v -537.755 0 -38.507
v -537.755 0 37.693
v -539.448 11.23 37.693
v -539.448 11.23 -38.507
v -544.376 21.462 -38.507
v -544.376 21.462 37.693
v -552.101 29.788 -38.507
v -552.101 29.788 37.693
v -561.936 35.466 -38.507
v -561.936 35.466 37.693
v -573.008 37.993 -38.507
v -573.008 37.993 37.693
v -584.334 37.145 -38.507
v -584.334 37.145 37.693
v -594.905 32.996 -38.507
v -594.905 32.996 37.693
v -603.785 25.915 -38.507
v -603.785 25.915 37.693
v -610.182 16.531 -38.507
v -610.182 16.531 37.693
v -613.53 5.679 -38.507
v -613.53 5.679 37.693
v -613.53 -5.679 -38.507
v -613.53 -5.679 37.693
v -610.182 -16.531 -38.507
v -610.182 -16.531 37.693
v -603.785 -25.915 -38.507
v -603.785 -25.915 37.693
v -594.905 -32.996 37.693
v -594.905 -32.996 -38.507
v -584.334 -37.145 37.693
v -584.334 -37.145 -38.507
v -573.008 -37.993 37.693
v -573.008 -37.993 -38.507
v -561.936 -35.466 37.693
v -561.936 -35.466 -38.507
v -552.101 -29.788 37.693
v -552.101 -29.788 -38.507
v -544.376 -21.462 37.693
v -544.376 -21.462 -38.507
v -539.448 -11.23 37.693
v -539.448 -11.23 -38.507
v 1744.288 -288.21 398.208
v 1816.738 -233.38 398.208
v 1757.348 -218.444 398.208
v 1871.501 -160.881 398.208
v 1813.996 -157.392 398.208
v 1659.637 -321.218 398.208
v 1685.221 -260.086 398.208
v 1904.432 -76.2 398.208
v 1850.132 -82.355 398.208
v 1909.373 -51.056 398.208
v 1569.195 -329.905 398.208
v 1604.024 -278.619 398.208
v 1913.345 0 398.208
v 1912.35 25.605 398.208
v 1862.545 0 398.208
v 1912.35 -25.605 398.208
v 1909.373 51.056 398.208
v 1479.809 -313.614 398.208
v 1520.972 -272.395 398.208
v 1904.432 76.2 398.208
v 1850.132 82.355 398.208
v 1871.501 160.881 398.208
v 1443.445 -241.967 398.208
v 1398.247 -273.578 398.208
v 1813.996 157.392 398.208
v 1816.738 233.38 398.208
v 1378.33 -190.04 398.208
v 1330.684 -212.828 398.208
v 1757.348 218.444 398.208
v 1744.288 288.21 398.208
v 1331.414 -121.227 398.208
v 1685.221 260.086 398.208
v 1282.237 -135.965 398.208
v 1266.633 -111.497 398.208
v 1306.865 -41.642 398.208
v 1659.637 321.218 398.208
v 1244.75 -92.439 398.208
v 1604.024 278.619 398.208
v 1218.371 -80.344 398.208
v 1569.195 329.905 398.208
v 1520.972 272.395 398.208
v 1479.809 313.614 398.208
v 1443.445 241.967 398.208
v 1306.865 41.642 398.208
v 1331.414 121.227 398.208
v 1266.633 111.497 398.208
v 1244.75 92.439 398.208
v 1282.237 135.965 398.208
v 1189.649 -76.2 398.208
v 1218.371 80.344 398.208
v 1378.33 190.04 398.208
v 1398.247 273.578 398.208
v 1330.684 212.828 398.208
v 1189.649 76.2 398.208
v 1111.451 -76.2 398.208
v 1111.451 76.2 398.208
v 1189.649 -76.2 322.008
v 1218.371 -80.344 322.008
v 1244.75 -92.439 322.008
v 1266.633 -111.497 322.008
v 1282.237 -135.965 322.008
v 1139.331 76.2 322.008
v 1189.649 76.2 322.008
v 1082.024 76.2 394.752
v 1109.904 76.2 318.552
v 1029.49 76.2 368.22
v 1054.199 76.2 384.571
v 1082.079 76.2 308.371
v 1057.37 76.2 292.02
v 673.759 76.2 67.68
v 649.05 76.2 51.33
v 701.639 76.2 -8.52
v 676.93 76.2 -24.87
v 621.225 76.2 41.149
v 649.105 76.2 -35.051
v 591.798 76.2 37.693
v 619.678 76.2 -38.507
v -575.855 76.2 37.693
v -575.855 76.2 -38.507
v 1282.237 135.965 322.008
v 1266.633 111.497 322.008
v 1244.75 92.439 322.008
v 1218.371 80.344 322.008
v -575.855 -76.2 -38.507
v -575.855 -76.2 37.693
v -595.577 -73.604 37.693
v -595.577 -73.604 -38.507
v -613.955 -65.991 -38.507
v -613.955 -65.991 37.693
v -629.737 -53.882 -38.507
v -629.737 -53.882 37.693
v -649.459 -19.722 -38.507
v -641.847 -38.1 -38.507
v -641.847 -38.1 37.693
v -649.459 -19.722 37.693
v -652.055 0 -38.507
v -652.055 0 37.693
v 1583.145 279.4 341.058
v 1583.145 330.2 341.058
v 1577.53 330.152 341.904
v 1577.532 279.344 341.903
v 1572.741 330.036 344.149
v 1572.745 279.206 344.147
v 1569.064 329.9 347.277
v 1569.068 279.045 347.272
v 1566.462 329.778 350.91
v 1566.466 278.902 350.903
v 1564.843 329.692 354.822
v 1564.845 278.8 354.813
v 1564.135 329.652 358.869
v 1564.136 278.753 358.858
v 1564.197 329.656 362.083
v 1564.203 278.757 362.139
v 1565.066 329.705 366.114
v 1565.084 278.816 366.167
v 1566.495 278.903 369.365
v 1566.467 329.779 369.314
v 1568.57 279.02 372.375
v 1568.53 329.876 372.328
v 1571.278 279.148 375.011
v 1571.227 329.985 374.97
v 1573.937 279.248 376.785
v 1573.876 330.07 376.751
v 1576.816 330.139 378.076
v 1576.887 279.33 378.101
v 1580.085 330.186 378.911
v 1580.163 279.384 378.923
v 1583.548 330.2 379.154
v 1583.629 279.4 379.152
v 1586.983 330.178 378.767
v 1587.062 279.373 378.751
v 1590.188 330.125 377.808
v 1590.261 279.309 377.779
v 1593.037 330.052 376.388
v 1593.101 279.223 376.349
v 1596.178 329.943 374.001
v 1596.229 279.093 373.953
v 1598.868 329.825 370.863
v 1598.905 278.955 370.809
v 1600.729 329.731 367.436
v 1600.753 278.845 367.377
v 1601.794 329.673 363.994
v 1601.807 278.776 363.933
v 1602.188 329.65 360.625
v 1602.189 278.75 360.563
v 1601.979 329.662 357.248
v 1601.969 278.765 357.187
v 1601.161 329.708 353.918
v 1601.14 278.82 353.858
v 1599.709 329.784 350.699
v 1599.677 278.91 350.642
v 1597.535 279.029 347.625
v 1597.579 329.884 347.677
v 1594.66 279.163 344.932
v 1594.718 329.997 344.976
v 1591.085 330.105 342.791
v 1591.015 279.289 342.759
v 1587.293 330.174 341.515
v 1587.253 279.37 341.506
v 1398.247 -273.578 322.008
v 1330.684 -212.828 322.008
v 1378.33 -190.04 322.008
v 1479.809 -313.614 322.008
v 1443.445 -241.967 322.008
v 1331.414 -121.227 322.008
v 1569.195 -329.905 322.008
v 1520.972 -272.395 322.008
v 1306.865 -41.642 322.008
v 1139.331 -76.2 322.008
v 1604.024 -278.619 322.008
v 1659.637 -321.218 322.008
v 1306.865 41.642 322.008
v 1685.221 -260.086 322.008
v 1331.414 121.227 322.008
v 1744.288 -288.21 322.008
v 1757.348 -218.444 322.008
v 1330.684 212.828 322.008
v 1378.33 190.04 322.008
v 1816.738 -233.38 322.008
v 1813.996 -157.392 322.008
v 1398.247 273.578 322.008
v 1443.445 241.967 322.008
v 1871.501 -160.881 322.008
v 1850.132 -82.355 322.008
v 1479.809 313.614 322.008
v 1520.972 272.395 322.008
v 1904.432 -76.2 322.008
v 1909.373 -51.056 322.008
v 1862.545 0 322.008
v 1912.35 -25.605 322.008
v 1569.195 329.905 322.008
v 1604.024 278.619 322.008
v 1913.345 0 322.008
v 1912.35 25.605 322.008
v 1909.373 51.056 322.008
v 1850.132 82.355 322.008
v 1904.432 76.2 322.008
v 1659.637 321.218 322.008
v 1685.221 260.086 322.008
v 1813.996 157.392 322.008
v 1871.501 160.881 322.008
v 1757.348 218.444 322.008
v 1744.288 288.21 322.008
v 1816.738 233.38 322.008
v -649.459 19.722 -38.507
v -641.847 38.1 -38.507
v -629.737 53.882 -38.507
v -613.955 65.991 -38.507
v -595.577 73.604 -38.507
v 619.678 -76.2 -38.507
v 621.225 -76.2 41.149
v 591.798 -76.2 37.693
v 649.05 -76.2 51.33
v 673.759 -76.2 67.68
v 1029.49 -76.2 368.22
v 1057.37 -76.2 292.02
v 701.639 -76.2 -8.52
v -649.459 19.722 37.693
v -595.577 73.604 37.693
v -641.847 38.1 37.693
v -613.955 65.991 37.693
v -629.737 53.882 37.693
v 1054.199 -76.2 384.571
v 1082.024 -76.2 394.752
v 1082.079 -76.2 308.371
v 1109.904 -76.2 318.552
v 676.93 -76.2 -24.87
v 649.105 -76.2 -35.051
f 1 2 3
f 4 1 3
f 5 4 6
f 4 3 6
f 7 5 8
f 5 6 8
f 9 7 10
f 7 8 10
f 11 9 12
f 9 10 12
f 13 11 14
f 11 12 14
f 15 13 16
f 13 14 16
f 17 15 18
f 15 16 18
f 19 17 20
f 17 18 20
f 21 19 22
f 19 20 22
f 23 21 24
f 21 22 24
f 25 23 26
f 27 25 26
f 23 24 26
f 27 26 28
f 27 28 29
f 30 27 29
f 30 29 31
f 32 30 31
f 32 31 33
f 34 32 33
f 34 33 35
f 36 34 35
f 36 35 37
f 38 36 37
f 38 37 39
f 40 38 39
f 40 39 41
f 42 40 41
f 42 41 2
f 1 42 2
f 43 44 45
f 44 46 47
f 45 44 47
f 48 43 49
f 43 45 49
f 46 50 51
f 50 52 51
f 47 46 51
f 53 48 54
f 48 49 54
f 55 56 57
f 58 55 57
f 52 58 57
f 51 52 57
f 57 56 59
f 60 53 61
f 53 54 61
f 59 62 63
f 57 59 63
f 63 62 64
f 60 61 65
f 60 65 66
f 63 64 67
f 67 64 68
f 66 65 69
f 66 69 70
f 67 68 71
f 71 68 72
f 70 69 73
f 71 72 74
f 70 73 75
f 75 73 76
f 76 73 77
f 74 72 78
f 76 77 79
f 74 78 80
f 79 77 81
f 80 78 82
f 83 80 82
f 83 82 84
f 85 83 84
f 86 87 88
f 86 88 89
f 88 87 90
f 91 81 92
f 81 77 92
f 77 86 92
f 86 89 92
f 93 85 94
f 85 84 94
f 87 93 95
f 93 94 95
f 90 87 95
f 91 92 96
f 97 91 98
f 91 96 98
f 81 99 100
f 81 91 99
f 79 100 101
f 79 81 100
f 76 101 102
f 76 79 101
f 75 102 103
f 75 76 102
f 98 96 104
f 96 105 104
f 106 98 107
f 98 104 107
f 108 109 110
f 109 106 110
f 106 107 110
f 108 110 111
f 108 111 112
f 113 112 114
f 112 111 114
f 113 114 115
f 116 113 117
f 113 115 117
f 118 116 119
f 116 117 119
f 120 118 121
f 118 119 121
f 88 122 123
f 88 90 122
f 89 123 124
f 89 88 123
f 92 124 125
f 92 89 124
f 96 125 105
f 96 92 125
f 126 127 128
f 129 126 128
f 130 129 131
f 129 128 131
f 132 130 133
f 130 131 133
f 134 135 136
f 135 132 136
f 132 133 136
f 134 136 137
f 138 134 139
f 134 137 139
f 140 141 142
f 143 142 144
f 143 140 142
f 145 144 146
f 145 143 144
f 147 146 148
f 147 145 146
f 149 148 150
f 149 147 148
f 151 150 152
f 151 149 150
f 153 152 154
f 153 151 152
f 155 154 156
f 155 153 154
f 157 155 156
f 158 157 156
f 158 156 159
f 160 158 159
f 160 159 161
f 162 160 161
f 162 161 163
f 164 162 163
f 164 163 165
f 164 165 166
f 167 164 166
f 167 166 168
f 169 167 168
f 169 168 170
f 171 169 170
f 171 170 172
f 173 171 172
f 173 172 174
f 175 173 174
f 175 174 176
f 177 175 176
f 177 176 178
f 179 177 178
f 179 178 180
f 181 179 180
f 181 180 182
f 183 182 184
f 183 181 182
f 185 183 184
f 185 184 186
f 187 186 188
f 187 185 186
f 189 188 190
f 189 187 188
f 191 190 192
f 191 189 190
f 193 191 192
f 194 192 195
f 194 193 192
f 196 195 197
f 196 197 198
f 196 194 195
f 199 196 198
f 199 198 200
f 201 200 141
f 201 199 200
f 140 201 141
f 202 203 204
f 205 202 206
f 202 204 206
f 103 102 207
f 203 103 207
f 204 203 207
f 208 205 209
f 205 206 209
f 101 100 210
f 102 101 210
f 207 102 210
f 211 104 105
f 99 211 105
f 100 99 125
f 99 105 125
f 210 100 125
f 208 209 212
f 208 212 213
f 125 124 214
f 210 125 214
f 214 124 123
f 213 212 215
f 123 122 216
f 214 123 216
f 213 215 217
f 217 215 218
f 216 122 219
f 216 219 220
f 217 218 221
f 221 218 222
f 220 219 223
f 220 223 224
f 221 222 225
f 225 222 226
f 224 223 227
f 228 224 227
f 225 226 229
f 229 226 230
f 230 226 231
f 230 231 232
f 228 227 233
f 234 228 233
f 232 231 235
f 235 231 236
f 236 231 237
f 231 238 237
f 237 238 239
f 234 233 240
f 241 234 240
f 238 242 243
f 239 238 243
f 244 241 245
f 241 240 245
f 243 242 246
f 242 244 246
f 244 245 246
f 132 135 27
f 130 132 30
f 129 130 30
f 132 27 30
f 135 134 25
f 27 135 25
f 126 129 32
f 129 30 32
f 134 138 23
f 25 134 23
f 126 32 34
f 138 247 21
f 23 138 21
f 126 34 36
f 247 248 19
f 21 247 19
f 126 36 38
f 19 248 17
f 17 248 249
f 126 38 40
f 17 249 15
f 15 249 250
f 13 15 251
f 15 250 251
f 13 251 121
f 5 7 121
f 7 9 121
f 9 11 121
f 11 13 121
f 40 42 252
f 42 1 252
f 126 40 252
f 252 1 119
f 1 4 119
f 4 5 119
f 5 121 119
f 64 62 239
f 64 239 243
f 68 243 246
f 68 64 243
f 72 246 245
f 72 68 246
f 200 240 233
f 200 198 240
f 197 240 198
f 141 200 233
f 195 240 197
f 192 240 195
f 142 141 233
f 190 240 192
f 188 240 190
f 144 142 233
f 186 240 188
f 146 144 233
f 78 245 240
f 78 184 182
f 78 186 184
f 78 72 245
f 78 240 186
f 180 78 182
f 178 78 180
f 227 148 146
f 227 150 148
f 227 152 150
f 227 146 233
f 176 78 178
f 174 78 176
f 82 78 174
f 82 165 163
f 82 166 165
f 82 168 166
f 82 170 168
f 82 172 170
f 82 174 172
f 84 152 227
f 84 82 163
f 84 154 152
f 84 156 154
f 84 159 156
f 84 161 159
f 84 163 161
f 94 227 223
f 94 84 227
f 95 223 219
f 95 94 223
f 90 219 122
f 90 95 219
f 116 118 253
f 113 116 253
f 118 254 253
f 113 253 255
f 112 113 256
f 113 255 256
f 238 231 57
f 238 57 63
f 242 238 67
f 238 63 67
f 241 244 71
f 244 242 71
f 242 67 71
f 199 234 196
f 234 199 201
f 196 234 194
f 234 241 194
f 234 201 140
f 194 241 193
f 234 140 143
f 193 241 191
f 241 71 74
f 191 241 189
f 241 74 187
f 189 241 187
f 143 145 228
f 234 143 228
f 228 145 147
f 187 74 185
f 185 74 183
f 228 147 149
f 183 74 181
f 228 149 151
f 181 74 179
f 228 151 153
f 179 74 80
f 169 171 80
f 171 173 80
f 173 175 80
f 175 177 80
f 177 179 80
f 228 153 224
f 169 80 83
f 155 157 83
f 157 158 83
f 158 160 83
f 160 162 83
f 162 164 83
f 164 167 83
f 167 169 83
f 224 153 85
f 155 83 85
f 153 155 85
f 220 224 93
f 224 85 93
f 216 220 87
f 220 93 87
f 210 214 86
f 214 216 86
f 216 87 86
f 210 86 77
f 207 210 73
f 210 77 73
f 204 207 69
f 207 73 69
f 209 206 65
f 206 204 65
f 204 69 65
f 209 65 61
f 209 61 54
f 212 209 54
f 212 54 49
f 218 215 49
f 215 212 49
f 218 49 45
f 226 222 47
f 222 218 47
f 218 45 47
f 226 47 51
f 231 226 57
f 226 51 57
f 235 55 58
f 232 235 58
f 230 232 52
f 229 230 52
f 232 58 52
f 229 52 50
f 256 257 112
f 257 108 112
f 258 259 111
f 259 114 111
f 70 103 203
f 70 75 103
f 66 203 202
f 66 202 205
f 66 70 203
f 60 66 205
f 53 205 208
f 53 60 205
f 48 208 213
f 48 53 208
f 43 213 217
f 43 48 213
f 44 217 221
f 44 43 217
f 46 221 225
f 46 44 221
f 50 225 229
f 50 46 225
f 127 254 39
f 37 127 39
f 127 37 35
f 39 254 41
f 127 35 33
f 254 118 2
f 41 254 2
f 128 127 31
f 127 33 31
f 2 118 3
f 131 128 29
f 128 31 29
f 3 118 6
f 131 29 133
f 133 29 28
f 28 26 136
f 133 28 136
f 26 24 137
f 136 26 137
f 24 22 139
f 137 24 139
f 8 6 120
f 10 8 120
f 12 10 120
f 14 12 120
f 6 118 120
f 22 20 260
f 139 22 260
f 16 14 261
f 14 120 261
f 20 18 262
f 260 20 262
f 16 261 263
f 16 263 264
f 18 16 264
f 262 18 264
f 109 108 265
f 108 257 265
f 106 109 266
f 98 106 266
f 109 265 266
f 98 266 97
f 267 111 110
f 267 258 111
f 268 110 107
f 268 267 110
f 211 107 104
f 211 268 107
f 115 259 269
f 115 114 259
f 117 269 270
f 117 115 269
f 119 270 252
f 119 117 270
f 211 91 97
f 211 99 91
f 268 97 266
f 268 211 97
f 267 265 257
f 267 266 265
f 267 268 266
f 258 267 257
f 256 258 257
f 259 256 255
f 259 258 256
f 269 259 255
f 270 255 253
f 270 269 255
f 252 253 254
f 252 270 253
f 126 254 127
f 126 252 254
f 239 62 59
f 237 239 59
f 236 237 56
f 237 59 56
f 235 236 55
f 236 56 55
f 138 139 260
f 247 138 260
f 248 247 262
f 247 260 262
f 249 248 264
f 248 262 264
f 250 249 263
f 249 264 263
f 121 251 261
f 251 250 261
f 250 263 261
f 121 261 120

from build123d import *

# Parameters (mm, degrees)
BOSS_EXTRUDE1_DEPTH = 76.2
FILLET1_R           = 127
CUT_EXTRUDE1_DEPTH  = 152.4
SKETCH4_R           = 38.1
CUT_EXTRUDE2_DEPTH  = 152.4
SKETCH5_R           = 330.2
SKETCH5_R_2         = 279.4
BOSS_EXTRUDE2_DEPTH = 76.2
CUT_EXTRUDE3_DEPTH  = 76.2
SKETCH7_R           = 279.4
CUT_EXTRUDE4_DEPTH  = 76.2
FILLET2_R           = 101.6
SKETCH10_R          = 19.05
CUT_EXTRUDE5_DEPTH  = 1983.041579978


with BuildPart() as part:
    # Sketch1 → Boss-Extrude1 (new, symmetric)
    with BuildSketch(Plane(origin=(0, 0, 0), x_dir=(1, 0, 0), z_dir=(0, 1, 0))):
        Polygon((666.144379946, 38.507212604), (1092.864379946, -322.007837556), (1913.344533237, -322.007837556), (1913.344533237, -398.207837556), (1064.984533237, -398.207837556), (638.264533237, -37.692787396), (-652.055466763, -37.692787396), (-652.055466763, 38.507212604), align=None)
    extrude(amount=BOSS_EXTRUDE1_DEPTH, both=True)

    # Fillet1
    fillet1_edges = [part.edges().sort_by_distance(p)[0] for p in [
        (666.144379946, 0, -38.507212604),
        (1092.864379946, 0, 322.007837556),
        (1064.984533237, 0, 398.207837556),
        (638.264533237, 0, 37.692787396),
    ]]
    fillet(fillet1_edges, radius=FILLET1_R)

    # Sketch3 → Cut-Extrude1 (cut)
    with BuildSketch(Plane.XY.offset(37.692787396)):
        with BuildLine():
            ThreePointArc((-652.055466763, -4.31e-07), (-629.737003641, 53.881536574), (-575.855466763, 76.2))
            Line((-575.855466763, 76.2), (-652.055466763, 76.2))
            Line((-652.055466763, 76.2), (-652.055466763, -4.31e-07))
        make_face()
        with BuildLine():
            ThreePointArc((-575.855466763, -76.2), (-629.737003336, -53.881536879), (-652.055466763, -4.31e-07))
            Line((-652.055466763, -4.31e-07), (-652.055466763, -76.2))
            Line((-652.055466763, -76.2), (-575.855466763, -76.2))
        make_face()
    extrude(amount=-CUT_EXTRUDE1_DEPTH, mode=Mode.SUBTRACT)

    # Sketch4 → Cut-Extrude2 (cut)
    with BuildSketch(Plane.XY.offset(37.692787396)):
        with Locations((-575.855466763, 0)):
            Circle(SKETCH4_R)
    extrude(amount=-CUT_EXTRUDE2_DEPTH, mode=Mode.SUBTRACT)

    # Sketch5 → Boss-Extrude2 (add)
    with BuildSketch(Plane.XY.offset(398.207837556)):
        with Locations((1583.144533237, 0)):
            Circle(SKETCH5_R)
        with Locations((1583.144533237, 0)):
            Circle(SKETCH5_R_2, mode=Mode.SUBTRACT)
    extrude(amount=-BOSS_EXTRUDE2_DEPTH)

    # Sketch6 → Cut-Extrude3 (cut)
    with BuildSketch(Plane.XY.offset(398.207837556)):
        with BuildLine():
            Line((1913.344533237, 76.2), (1904.431943511, 76.2))
            ThreePointArc((1904.431943511, 76.2), (1911.108817019, 38.359725806), (1913.344533237, 0))
            Line((1913.344533237, 0), (1913.344533237, 76.2))
        make_face()
        with BuildLine():
            Line((1913.344533237, -76.2), (1913.344533237, 0))
            ThreePointArc((1913.344533237, 0), (1911.108817019, -38.359725806), (1904.431943511, -76.2))
            Line((1904.431943511, -76.2), (1913.344533237, -76.2))
        make_face()
    extrude(amount=-CUT_EXTRUDE3_DEPTH, mode=Mode.SUBTRACT)

    # Sketch7 → Cut-Extrude4 (cut)
    with BuildSketch(Plane.XY.offset(398.207837556)):
        with Locations((1583.144533237, 0)):
            Circle(SKETCH7_R)
    extrude(amount=-CUT_EXTRUDE4_DEPTH, mode=Mode.SUBTRACT)

    # Fillet2
    fillet2_edges = [part.edges().sort_by_distance(p)[0] for p in [
        (1261.857122964, -76.2, 360.107837556),
        (1261.857122964, 76.2, 360.107837556),
    ]]
    fillet(fillet2_edges, radius=FILLET2_R)

    # Sketch10 → Cut-Extrude5 (cut, through all)
    with BuildSketch(Plane(origin=(0, 0, 0), x_dir=(1, 0, 0), z_dir=(0, 1, 0))):
        with Locations(Location((1583.144533237, -360.107837556, 0), (0, 0, 90))):
            Circle(SKETCH10_R)
    extrude(amount=CUT_EXTRUDE5_DEPTH, mode=Mode.SUBTRACT)


solid = part.part
